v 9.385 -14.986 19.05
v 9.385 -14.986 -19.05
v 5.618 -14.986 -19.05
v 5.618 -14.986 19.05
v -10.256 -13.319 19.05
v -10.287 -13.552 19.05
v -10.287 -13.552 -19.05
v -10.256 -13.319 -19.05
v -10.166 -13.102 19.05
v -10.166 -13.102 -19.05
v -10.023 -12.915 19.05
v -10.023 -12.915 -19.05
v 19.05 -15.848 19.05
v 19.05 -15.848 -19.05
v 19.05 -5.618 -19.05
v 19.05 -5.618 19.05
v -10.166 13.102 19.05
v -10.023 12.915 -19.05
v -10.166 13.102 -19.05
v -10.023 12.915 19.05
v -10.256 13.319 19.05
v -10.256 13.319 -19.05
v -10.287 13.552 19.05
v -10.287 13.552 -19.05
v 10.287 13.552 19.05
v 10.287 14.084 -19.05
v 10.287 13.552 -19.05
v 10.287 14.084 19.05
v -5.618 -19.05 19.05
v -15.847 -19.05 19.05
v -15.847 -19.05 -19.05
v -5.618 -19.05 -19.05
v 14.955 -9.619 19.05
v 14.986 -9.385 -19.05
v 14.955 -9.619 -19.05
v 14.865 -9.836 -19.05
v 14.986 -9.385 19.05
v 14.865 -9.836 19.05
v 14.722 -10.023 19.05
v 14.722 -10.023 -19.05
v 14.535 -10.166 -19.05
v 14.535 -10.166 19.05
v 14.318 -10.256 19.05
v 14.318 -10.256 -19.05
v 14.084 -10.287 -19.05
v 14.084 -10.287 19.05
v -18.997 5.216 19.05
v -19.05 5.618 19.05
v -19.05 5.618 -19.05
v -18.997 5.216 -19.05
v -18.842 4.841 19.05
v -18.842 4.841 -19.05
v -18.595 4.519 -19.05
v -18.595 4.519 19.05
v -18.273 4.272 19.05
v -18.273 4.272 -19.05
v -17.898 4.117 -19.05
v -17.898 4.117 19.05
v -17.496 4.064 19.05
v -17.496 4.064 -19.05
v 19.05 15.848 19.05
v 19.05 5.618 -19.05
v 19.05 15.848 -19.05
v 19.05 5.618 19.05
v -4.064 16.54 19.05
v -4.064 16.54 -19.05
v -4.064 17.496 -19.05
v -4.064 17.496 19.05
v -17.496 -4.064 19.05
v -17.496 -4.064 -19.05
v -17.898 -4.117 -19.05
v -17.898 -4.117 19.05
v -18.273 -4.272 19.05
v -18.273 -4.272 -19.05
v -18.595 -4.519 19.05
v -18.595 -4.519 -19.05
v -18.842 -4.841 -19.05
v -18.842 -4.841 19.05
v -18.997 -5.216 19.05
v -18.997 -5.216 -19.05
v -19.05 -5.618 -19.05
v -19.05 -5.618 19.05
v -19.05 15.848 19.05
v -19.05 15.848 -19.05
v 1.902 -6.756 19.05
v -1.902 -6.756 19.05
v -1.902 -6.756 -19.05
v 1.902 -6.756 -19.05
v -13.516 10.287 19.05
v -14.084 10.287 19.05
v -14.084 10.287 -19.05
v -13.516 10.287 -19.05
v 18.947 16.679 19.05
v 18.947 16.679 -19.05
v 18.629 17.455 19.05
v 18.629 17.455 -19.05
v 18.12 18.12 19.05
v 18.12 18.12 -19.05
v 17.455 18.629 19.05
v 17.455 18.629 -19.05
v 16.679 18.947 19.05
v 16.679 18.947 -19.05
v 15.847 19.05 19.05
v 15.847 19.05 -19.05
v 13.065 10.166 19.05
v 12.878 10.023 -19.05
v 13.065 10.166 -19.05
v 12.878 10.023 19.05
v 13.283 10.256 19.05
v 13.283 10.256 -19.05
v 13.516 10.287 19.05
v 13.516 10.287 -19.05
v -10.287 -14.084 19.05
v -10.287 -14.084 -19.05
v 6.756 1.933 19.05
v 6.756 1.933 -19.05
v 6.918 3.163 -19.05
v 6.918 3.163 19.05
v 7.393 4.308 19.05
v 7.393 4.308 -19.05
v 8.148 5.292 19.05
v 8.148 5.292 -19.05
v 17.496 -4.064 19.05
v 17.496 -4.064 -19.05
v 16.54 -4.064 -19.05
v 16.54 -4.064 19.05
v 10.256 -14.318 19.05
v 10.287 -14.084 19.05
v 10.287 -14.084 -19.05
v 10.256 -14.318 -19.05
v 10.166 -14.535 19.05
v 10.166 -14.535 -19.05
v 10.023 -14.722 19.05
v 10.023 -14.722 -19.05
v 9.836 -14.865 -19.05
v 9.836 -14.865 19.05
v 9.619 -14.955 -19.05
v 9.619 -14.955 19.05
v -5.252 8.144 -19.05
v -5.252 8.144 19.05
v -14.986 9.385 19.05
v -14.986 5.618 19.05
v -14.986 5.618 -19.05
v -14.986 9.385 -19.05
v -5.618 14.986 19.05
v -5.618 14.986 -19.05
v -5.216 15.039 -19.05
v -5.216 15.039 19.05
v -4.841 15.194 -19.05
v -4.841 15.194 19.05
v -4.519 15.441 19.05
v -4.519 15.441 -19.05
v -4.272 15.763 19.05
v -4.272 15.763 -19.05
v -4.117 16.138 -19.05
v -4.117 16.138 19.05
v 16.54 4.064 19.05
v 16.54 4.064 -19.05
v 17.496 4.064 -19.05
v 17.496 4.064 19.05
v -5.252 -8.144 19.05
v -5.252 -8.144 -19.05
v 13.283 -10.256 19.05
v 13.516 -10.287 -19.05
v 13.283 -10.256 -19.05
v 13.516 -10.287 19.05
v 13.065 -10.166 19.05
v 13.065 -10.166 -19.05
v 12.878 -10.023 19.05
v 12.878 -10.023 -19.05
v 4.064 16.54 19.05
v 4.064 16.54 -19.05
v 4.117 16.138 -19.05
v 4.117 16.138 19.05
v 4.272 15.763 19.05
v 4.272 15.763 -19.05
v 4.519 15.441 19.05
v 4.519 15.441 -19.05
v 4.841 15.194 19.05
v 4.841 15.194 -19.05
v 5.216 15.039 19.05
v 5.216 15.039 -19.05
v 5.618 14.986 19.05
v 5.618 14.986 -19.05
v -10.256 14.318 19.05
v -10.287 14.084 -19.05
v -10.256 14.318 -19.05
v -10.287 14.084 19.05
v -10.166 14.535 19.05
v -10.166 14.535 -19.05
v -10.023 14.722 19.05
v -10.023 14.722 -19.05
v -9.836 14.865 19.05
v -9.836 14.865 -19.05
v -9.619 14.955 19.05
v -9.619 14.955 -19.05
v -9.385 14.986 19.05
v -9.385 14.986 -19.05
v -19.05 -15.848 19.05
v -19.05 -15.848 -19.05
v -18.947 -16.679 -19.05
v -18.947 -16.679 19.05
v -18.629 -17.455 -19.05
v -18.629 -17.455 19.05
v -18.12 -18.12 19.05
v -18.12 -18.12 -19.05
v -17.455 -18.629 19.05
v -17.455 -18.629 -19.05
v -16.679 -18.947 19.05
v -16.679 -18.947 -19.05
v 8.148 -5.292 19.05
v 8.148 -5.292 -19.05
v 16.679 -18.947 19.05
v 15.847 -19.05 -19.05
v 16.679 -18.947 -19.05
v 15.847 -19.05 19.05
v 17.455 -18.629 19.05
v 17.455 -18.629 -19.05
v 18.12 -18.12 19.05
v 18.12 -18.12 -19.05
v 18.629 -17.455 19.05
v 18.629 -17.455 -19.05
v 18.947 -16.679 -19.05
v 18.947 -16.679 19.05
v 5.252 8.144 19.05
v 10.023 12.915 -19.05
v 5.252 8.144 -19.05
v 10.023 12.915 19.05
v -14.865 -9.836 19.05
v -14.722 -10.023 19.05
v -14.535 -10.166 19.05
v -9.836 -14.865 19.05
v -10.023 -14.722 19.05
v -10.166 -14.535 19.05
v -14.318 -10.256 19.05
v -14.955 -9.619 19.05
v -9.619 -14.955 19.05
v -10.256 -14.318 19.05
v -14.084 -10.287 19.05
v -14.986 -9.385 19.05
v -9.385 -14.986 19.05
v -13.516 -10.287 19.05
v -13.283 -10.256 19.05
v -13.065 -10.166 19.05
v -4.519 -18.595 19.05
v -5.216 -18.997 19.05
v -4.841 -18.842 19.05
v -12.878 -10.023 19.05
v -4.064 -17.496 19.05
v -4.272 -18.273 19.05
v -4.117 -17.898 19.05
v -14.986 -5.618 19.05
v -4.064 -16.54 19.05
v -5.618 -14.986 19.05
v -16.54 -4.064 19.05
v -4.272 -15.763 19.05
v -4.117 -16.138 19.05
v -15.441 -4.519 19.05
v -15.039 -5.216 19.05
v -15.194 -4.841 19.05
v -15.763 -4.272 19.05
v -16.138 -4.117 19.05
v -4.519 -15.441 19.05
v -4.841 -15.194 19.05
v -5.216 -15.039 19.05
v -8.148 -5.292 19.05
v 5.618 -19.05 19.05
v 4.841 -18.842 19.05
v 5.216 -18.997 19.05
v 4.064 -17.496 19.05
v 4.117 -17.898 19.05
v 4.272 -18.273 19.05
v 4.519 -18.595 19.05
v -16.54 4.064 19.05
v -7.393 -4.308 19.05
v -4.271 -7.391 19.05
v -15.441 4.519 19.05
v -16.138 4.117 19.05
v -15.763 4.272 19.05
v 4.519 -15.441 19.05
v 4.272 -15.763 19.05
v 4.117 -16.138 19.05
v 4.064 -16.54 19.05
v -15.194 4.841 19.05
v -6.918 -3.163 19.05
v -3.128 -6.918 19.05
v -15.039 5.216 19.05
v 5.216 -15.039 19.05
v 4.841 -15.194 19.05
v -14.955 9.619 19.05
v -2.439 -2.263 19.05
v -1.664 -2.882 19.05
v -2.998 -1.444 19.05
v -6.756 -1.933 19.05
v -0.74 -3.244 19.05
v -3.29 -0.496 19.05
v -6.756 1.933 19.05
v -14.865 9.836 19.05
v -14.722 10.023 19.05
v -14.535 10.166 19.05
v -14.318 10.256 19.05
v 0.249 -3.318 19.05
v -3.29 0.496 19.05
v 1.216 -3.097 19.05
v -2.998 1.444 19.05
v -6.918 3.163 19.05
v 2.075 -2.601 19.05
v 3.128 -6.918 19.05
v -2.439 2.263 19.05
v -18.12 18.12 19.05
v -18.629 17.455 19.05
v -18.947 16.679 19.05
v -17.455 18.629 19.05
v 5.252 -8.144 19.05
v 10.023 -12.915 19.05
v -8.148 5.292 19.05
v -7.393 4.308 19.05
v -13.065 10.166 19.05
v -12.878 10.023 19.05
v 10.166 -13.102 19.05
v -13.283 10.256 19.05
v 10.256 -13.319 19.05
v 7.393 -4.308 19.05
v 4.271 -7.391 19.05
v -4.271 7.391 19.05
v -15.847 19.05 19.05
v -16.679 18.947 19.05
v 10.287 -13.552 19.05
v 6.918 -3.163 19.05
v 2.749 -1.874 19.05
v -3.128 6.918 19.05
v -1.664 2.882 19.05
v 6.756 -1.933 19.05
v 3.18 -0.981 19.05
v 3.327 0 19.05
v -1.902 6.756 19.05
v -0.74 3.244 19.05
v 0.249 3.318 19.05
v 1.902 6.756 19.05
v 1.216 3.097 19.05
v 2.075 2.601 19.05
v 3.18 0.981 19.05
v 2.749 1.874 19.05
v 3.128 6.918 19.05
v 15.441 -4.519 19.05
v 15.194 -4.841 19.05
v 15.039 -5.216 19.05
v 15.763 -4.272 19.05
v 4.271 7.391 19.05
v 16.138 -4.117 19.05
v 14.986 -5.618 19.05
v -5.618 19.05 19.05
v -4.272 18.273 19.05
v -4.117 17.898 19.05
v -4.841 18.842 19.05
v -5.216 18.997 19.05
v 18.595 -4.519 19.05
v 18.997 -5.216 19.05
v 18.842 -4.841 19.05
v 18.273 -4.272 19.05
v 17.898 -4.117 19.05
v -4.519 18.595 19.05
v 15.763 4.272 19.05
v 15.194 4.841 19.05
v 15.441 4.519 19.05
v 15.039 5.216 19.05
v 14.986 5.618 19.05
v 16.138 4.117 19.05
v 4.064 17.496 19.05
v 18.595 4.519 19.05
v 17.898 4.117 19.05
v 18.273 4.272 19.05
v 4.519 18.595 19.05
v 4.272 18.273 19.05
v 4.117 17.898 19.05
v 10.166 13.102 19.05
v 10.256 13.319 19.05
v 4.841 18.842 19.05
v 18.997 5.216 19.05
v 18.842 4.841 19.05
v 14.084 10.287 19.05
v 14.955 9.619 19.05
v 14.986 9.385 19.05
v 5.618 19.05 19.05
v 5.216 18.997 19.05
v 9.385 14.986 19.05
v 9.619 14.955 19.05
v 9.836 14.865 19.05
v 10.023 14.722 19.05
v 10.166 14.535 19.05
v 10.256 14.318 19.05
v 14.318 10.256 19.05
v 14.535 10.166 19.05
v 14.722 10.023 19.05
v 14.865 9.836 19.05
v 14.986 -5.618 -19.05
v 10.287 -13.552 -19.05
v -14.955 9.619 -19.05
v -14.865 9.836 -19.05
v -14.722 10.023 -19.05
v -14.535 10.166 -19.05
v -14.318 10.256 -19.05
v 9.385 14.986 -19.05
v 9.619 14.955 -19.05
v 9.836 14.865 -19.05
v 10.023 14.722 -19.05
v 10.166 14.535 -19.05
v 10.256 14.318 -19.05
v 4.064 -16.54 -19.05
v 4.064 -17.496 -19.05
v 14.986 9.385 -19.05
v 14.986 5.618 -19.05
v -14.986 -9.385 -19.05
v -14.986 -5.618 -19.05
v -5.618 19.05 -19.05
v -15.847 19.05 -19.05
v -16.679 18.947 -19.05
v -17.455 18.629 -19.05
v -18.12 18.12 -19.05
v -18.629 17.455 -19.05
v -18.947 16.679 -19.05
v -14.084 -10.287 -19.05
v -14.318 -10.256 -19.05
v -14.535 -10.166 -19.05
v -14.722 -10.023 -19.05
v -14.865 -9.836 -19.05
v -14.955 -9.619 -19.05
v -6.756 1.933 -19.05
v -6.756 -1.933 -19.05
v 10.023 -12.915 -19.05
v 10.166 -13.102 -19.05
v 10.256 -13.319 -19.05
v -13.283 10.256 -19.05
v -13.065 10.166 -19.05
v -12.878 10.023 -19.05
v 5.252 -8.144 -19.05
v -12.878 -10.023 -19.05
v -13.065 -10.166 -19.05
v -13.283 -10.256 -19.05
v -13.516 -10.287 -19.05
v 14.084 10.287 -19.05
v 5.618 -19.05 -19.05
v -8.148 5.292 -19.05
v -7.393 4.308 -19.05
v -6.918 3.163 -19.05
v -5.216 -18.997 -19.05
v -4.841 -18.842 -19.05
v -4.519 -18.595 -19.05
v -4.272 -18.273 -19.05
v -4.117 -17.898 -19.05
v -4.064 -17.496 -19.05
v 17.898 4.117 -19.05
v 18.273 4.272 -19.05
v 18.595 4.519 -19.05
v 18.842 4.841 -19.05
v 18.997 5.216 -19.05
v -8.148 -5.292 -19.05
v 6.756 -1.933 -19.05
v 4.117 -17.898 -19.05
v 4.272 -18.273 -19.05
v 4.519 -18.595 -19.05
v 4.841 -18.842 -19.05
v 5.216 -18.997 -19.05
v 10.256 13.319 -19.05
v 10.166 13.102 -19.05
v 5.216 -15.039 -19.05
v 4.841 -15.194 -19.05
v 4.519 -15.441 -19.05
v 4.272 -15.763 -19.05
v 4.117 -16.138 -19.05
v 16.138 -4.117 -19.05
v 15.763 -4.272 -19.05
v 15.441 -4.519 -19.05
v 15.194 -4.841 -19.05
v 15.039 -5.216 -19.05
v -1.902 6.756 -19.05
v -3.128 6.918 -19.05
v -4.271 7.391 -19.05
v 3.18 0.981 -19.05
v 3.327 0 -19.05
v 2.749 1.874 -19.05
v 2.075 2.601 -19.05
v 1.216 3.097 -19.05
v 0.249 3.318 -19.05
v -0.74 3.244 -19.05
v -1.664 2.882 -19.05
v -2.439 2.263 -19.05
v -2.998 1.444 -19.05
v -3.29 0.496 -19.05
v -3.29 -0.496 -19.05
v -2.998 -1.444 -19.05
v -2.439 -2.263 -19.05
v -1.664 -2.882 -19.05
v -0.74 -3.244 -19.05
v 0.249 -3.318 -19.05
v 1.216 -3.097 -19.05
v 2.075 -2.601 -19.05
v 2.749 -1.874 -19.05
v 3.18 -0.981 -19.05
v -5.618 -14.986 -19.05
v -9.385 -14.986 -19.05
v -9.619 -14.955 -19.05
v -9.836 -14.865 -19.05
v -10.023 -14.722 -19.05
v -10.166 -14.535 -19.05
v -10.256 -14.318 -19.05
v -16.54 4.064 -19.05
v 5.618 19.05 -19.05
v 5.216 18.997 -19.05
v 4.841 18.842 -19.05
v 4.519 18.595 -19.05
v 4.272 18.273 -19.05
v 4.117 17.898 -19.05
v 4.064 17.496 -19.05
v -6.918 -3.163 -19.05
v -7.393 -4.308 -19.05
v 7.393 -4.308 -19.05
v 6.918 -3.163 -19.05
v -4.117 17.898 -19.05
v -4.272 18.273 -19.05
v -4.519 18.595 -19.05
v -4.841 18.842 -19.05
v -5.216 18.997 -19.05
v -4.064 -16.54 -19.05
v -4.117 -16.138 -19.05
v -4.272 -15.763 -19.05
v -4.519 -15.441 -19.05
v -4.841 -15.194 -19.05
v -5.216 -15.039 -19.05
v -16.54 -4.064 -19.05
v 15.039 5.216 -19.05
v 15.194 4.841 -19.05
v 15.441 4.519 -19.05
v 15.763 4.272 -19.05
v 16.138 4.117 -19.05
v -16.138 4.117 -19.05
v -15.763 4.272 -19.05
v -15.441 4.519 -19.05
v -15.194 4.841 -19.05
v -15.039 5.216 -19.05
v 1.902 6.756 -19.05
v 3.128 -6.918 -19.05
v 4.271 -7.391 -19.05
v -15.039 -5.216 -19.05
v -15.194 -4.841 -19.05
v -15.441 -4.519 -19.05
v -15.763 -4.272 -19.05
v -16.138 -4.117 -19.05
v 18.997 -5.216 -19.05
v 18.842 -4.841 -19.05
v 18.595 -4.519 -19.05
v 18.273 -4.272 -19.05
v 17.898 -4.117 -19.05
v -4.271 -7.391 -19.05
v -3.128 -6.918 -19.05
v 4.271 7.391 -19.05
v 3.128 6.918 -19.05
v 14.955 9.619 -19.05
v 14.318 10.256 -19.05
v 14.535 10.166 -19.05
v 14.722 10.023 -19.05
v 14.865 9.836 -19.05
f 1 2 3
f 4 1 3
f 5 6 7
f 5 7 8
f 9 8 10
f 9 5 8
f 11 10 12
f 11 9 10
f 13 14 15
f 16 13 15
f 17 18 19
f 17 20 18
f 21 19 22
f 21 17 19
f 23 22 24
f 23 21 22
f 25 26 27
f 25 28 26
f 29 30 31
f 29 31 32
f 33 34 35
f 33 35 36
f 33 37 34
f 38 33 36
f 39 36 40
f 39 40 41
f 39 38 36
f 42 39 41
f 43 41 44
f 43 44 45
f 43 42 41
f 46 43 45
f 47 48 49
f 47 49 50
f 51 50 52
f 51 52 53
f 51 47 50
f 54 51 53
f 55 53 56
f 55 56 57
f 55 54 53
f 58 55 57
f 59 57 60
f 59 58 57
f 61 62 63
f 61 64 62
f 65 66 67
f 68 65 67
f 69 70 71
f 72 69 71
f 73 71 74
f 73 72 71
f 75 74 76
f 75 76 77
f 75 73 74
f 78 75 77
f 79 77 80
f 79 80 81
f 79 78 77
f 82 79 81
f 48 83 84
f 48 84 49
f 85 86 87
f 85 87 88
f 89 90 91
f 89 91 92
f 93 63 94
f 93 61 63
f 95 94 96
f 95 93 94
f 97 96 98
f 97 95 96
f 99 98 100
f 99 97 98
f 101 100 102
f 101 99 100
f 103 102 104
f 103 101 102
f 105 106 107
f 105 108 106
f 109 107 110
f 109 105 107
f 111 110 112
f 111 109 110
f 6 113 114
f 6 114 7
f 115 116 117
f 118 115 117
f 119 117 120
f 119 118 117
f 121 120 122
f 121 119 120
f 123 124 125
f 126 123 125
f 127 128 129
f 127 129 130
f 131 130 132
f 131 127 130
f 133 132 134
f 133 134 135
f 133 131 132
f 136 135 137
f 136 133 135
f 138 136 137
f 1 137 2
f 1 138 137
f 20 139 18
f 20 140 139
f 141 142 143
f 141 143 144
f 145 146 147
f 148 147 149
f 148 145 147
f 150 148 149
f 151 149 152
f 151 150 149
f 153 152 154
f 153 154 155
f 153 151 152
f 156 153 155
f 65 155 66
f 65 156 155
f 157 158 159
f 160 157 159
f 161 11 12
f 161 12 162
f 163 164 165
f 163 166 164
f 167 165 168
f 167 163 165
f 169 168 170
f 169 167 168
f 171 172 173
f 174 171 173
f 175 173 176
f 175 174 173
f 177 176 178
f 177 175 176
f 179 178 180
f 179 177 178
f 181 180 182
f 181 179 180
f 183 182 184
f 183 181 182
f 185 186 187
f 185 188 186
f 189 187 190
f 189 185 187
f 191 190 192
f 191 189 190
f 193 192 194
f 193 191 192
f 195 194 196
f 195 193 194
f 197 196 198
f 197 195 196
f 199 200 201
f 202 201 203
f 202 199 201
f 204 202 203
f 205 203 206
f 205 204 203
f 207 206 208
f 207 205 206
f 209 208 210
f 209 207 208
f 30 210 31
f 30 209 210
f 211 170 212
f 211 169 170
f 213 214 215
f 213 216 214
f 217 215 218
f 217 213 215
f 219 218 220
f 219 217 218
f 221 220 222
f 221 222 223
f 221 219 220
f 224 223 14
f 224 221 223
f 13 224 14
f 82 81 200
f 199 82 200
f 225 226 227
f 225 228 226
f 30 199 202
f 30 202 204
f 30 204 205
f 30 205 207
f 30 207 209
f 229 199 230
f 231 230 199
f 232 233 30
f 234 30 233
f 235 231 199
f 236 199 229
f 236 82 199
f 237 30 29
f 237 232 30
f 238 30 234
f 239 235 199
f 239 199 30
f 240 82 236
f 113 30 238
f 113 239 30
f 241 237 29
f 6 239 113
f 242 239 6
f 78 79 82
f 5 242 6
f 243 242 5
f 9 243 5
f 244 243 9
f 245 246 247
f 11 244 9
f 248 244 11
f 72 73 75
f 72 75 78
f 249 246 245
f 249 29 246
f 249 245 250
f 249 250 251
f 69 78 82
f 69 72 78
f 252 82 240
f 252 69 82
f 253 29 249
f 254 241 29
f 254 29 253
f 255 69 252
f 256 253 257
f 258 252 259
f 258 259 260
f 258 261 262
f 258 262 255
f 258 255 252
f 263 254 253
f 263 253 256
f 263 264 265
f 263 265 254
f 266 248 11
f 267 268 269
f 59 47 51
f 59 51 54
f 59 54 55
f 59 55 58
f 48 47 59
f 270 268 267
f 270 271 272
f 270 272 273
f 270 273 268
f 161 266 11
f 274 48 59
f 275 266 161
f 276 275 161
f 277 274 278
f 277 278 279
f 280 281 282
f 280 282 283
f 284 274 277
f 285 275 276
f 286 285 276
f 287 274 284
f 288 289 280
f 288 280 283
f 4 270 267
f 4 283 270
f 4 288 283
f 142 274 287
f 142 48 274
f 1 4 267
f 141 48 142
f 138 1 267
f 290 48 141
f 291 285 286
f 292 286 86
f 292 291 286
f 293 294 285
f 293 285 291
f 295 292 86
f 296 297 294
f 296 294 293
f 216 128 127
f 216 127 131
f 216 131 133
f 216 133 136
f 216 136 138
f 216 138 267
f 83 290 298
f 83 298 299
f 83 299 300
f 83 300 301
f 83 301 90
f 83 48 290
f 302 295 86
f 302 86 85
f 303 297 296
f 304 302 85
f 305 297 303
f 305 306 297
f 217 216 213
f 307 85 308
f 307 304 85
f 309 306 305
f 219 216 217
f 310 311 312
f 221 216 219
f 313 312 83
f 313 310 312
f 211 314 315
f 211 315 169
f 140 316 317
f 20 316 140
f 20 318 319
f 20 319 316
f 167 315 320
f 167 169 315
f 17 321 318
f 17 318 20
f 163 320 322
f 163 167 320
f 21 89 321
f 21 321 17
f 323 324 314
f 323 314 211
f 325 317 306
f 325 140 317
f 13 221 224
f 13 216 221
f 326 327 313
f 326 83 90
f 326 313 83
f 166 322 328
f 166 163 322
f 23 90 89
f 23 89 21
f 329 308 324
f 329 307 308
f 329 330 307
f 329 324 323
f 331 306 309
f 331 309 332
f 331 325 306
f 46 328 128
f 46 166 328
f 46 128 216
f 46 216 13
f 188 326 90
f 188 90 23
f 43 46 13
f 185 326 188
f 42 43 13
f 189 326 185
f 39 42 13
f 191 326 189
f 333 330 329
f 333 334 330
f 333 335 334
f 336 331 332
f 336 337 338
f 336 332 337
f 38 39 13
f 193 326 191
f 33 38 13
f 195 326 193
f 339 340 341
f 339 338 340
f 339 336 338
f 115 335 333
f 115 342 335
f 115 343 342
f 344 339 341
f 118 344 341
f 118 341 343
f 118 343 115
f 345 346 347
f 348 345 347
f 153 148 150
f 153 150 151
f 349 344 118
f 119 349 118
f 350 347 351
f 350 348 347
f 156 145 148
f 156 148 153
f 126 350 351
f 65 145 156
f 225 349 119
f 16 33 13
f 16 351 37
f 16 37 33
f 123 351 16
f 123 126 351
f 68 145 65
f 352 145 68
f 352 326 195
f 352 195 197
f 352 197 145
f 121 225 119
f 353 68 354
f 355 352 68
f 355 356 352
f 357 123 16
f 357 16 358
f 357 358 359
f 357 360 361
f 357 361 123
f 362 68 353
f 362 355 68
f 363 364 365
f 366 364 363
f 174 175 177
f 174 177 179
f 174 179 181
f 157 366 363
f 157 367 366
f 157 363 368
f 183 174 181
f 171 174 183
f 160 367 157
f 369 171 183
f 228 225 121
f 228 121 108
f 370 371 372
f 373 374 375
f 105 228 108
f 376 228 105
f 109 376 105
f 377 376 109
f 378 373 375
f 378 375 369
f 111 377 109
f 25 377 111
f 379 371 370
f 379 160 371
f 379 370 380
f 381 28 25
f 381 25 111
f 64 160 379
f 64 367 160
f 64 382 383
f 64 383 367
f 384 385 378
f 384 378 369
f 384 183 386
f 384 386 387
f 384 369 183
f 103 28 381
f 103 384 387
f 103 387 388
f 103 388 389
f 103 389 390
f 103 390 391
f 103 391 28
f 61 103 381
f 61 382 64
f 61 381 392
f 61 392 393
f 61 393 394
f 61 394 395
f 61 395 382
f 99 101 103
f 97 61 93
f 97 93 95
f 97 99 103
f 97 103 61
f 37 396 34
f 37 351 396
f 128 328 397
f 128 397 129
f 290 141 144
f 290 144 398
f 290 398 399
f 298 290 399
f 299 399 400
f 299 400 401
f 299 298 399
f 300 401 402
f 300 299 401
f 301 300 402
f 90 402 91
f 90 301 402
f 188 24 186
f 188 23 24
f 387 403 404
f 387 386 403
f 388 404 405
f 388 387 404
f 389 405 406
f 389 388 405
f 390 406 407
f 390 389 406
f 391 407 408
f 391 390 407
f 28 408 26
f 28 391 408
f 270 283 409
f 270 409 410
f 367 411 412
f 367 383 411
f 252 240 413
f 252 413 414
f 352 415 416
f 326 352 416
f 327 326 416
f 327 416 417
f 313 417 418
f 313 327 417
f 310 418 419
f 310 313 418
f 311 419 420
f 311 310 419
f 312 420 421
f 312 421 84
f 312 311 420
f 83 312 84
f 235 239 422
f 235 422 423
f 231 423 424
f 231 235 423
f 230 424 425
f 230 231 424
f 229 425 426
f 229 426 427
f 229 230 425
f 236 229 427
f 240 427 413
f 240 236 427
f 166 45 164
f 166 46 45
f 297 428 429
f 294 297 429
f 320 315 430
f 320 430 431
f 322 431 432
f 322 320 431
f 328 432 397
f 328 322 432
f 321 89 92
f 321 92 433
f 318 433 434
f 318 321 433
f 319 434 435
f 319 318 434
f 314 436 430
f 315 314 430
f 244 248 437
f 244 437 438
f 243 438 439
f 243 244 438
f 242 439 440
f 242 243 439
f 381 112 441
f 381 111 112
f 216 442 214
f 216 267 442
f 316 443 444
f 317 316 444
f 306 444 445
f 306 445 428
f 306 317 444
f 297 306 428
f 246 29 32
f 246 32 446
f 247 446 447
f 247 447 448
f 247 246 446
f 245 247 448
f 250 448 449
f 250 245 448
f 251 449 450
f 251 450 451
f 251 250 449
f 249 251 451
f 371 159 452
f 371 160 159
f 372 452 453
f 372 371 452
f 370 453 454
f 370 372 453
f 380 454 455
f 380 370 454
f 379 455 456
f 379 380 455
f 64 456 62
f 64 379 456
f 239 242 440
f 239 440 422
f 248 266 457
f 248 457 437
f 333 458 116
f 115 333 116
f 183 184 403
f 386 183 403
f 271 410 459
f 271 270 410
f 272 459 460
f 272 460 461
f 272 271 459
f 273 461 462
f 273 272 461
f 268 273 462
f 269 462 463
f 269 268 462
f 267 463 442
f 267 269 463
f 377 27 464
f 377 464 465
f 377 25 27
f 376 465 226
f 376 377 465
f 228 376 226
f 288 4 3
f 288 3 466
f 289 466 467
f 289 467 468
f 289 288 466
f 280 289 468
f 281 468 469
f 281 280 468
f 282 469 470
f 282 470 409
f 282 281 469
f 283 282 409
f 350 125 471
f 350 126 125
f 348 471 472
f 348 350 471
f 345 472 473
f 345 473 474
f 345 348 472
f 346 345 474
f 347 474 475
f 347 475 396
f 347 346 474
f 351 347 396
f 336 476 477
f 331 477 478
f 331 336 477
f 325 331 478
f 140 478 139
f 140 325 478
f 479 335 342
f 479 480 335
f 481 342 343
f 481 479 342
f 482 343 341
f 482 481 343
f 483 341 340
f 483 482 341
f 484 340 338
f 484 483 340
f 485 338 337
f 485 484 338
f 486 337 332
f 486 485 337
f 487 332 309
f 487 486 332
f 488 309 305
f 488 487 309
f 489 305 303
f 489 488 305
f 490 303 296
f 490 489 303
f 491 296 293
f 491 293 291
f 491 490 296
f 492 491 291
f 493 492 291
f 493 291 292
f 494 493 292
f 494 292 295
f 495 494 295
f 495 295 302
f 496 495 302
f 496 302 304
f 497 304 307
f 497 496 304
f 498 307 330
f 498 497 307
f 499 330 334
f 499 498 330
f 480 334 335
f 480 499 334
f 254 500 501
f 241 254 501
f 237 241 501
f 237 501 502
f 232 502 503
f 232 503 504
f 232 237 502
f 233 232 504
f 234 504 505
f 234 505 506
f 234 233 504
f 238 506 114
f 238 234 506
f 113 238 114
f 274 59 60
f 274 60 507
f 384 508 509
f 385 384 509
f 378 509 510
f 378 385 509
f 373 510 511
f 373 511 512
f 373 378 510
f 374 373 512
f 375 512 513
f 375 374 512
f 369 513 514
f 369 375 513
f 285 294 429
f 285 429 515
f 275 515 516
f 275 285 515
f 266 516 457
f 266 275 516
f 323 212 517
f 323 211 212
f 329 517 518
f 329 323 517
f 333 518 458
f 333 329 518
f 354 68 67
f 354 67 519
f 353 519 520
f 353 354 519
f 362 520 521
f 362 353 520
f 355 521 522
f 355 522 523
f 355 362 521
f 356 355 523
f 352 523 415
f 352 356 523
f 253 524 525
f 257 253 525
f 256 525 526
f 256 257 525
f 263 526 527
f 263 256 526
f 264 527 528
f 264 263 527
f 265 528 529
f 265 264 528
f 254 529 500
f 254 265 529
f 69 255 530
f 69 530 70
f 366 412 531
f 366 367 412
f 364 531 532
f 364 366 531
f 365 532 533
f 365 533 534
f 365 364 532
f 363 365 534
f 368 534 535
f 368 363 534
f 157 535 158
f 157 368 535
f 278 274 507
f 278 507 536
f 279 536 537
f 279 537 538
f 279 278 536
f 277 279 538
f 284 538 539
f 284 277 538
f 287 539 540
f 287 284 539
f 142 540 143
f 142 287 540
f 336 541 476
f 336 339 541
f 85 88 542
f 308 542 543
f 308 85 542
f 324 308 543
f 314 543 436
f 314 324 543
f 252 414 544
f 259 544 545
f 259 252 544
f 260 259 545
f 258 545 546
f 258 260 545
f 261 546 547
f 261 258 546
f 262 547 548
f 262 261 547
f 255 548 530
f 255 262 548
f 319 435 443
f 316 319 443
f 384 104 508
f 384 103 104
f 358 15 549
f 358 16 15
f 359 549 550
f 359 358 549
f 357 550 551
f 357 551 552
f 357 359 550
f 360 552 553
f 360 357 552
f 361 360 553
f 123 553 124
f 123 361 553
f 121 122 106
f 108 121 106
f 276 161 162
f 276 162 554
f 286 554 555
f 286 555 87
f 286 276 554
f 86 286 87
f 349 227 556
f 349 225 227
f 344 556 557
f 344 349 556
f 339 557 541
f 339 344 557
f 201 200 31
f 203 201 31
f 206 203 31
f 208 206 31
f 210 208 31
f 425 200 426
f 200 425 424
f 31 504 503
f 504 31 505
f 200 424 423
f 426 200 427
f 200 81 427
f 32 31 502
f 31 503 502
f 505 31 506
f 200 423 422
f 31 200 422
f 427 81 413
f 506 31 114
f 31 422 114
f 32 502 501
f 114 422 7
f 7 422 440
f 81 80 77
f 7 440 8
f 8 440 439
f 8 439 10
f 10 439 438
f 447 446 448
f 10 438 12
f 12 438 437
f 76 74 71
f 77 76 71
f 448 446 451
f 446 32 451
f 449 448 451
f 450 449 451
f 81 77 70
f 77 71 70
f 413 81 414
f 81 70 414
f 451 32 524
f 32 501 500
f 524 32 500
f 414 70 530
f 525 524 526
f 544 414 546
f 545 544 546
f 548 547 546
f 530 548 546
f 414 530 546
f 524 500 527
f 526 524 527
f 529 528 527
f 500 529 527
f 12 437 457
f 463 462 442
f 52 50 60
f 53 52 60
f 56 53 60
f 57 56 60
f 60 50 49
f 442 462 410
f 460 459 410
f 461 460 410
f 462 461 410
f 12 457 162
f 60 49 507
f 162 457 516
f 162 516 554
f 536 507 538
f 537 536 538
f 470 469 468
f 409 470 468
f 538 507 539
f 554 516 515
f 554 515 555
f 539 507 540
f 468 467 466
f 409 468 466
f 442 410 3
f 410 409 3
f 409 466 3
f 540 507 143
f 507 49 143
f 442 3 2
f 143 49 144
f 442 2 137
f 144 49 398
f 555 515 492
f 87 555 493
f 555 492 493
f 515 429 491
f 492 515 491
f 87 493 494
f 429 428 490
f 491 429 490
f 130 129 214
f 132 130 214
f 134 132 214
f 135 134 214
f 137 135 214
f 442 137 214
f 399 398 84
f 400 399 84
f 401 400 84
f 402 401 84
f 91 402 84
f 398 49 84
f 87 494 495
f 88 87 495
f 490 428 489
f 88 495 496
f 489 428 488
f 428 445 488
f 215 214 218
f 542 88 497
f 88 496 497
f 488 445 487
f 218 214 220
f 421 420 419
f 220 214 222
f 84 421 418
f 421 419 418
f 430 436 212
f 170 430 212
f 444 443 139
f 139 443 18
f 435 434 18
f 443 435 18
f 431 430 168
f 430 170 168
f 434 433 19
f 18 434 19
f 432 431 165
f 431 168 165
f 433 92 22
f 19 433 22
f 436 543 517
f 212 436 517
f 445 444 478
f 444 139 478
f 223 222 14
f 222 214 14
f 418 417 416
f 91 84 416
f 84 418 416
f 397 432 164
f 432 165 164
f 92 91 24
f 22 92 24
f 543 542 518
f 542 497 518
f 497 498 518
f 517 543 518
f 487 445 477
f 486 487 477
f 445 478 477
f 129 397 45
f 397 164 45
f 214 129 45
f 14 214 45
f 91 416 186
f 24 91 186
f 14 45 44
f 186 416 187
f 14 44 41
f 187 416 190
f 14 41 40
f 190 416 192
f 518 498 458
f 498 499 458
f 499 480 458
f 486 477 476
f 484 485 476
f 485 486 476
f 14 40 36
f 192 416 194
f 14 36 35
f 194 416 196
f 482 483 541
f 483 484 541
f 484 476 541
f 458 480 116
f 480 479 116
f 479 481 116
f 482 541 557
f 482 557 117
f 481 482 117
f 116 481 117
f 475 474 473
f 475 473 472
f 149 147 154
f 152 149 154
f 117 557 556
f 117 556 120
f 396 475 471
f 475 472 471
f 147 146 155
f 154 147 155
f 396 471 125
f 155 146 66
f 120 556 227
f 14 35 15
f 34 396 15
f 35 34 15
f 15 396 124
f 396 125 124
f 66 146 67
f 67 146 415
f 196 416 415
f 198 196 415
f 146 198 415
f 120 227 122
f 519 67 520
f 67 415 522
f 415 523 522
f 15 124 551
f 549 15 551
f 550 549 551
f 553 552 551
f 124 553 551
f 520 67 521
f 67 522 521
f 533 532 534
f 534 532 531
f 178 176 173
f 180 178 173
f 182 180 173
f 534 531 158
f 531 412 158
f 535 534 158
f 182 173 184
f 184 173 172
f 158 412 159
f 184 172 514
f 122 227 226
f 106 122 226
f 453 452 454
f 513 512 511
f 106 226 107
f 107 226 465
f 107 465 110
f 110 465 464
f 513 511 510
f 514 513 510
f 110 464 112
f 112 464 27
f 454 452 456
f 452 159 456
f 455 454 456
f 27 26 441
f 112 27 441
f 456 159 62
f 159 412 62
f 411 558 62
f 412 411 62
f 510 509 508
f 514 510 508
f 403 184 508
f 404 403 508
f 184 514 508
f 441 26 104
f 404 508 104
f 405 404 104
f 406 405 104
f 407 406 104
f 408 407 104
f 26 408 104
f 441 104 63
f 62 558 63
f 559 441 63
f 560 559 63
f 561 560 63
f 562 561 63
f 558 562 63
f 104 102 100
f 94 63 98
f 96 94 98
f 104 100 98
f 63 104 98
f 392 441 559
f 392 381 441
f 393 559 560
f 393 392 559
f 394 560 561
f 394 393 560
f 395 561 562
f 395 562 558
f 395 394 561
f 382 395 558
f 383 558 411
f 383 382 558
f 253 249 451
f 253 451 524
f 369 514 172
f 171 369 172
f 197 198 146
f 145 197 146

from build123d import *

# Parameters (mm, degrees)
SKETCH1_R           = 3.3274
BOSS_EXTRUDE1_DEPTH = 19.05


with BuildPart() as part:
    # Sketch1 → Boss-Extrude1 (new body, symmetric)
    with BuildSketch(Plane.XY):
        with BuildLine():
            Line((-4.064, 16.539617552), (-4.064, 17.496382454))
            ThreePointArc((-4.064, 17.496382454), (-4.519044044, 18.594955958), (-5.617617547, 19.050000004))
            Line((-5.617617547, 19.050000004), (-15.84748704, 19.050000004))
            ThreePointArc((-15.84748704, 19.050000004), (-18.12017629, 18.120192086), (-19.050000001, 15.847509297))
            Line((-19.050000001, 15.847509297), (-19.050000001, 5.617617549))
            ThreePointArc((-19.050000001, 5.617617549), (-18.594955957, 4.519044045), (-17.496382454, 4.064))
            Line((-17.496382454, 4.064), (-16.539617549, 4.064))
            ThreePointArc((-16.539617549, 4.064), (-15.441044044, 4.519044045), (-14.986, 5.617617549))
            Line((-14.986, 5.617617549), (-14.986, 9.385342517))
            ThreePointArc((-14.986, 9.385342517), (-14.721898184, 10.022940701), (-14.0843, 10.287042517))
            Line((-14.0843, 10.287042517), (-13.516042086, 10.287042517))
            ThreePointArc((-13.516042086, 10.287042517), (-13.170975923, 10.218404479), (-12.878443117, 10.022939917))
            Line((-12.878443117, 10.022939917), (-8.14758008, 5.292065242))
            ThreePointArc((-8.14758008, 5.292065242), (-7.117955877, 3.751120652), (-6.756399998, 1.933453582))
            Line((-6.756399998, 1.933453582), (-6.756399998, -1.933453584))
            ThreePointArc((-6.756399998, -1.933453584), (-7.117955877, -3.751120652), (-8.147580078, -5.292065242))
            Line((-8.147580078, -5.292065242), (-12.878443116, -10.022939917))
            ThreePointArc((-12.878443116, -10.022939917), (-13.170975922, -10.21840448), (-13.516042086, -10.287042518))
            Line((-13.516042086, -10.287042518), (-14.0843, -10.287042518))
            ThreePointArc((-14.0843, -10.287042518), (-14.721898185, -10.022940703), (-14.986, -9.385342518))
            Line((-14.986, -9.385342518), (-14.986, -5.617617549))
            ThreePointArc((-14.986, -5.617617549), (-15.441044044, -4.519044046), (-16.539617547, -4.064))
            Line((-16.539617547, -4.064), (-17.496382452, -4.064))
            ThreePointArc((-17.496382452, -4.064), (-18.594955956, -4.519044044), (-19.050000001, -5.617617547))
            Line((-19.050000001, -5.617617547), (-19.050000001, -15.84751072))
            ThreePointArc((-19.050000001, -15.84751072), (-18.120175718, -18.120192644), (-15.84748687, -19.050000001))
            Line((-15.84748687, -19.050000001), (-5.617617549, -19.050000001))
            ThreePointArc((-5.617617549, -19.050000001), (-4.519044046, -18.594955957), (-4.064, -17.496382454))
            Line((-4.064, -17.496382454), (-4.064, -16.539617549))
            ThreePointArc((-4.064, -16.539617549), (-4.519044045, -15.441044044), (-5.617617549, -14.985999999))
            Line((-5.617617549, -14.985999999), (-9.3853, -14.985999999))
            ThreePointArc((-9.3853, -14.985999999), (-10.022898185, -14.721898184), (-10.287, -14.084299999))
            Line((-10.287, -14.084299999), (-10.287, -13.552357131))
            ThreePointArc((-10.287, -13.552357131), (-10.218362387, -13.207291993), (-10.022898969, -12.914759731))
            Line((-10.022898969, -12.914759731), (-5.252158104, -8.14400713))
            ThreePointArc((-5.252158104, -8.14400713), (-3.715177371, -7.117027388), (-1.902183976, -6.7564))
            Line((-1.902183976, -6.7564), (1.902183976, -6.7564))
            ThreePointArc((1.902183976, -6.7564), (3.715177372, -7.117027388), (5.252158106, -8.144007132))
            Line((5.252158106, -8.144007132), (10.022898969, -12.91475973))
            ThreePointArc((10.022898969, -12.91475973), (10.218362387, -13.207291993), (10.287000001, -13.552357132))
            Line((10.287000001, -13.552357132), (10.287000001, -14.0843))
            ThreePointArc((10.287000001, -14.0843), (10.022898185, -14.721898184), (9.385300001, -14.986))
            Line((9.385300001, -14.986), (5.617617549, -14.986))
            ThreePointArc((5.617617549, -14.986), (4.519044045, -15.441044044), (4.064, -16.539617547))
            Line((4.064, -16.539617547), (4.064, -17.496382452))
            ThreePointArc((4.064, -17.496382452), (4.519044043, -18.594955955), (5.617617546, -19.050000001))
            Line((5.617617546, -19.050000001), (15.847486867, -19.050000001))
            ThreePointArc((15.847486867, -19.050000001), (18.120175716, -18.120192646), (19.05, -15.847510723))
            Line((19.05, -15.847510723), (19.05, -5.617617549))
            ThreePointArc((19.05, -5.617617549), (18.594955955, -4.519044045), (17.496382451, -4.064))
            Line((17.496382451, -4.064), (16.539617548, -4.064))
            ThreePointArc((16.539617548, -4.064), (15.441044044, -4.519044045), (14.985999999, -5.617617549))
            Line((14.985999999, -5.617617549), (14.985999999, -9.385342517))
            ThreePointArc((14.985999999, -9.385342517), (14.721898184, -10.022940701), (14.084299999, -10.287042517))
            Line((14.084299999, -10.287042517), (13.516042085, -10.287042517))
            ThreePointArc((13.516042085, -10.287042517), (13.170975922, -10.218404479), (12.878443117, -10.022939917))
            Line((12.878443117, -10.022939917), (8.147580079, -5.292065242))
            ThreePointArc((8.147580079, -5.292065242), (7.117955877, -3.751120652), (6.756399998, -1.933453583))
            Line((6.756399998, -1.933453583), (6.756399998, 1.933453583))
            ThreePointArc((6.756399998, 1.933453583), (7.117955877, 3.751120652), (8.147580078, 5.292065242))
            Line((8.147580078, 5.292065242), (12.878443116, 10.022939916))
            ThreePointArc((12.878443116, 10.022939916), (13.170975922, 10.218404477), (13.516042084, 10.287042515))
            Line((13.516042084, 10.287042515), (14.084299998, 10.287042515))
            ThreePointArc((14.084299998, 10.287042515), (14.721898183, 10.0229407), (14.985999998, 9.385342515))
            Line((14.985999998, 9.385342515), (14.985999998, 5.617617546))
            ThreePointArc((14.985999998, 5.617617546), (15.441044043, 4.519044042), (16.539617547, 4.063999997))
            Line((16.539617547, 4.063999997), (17.49638245, 4.063999997))
            ThreePointArc((17.49638245, 4.063999997), (18.594955956, 4.519044042), (19.05, 5.617617548))
            Line((19.05, 5.617617548), (19.05, 15.8475093))
            ThreePointArc((19.05, 15.8475093), (18.120176289, 18.120192086), (15.847487041, 19.050000004))
            Line((15.847487041, 19.050000004), (5.617617548, 19.050000004))
            ThreePointArc((5.617617548, 19.050000004), (4.519044044, 18.594955959), (4.063999999, 17.496382454))
            Line((4.063999999, 17.496382454), (4.063999999, 16.539617552))
            ThreePointArc((4.063999999, 16.539617552), (4.519044044, 15.441044047), (5.617617548, 14.986000002))
            Line((5.617617548, 14.986000002), (9.385299999, 14.986000002))
            ThreePointArc((9.385299999, 14.986000002), (10.022898183, 14.721898187), (10.286999999, 14.084300002))
            Line((10.286999999, 14.084300002), (10.286999999, 13.552357134))
            ThreePointArc((10.286999999, 13.552357134), (10.218362386, 13.207291996), (10.022898968, 12.914759734))
            Line((10.022898968, 12.914759734), (5.252158103, 8.144007133))
            ThreePointArc((5.252158103, 8.144007133), (3.71517737, 7.117027391), (1.902183975, 6.756400003))
            Line((1.902183975, 6.756400003), (-1.902183977, 6.756400003))
            ThreePointArc((-1.902183977, 6.756400003), (-3.715177373, 7.117027391), (-5.252158106, 8.144007134))
            Line((-5.252158106, 8.144007134), (-10.022898969, 12.914759733))
            ThreePointArc((-10.022898969, 12.914759733), (-10.218362387, 13.207291995), (-10.287000001, 13.552357134))
            Line((-10.287000001, 13.552357134), (-10.287000001, 14.084300002))
            ThreePointArc((-10.287000001, 14.084300002), (-10.022898186, 14.721898187), (-9.385300001, 14.986000002))
            Line((-9.385300001, 14.986000002), (-5.617617549, 14.986000002))
            ThreePointArc((-5.617617549, 14.986000002), (-4.519044044, 15.441044047), (-4.064, 16.539617552))
        make_face()
        Circle(SKETCH1_R, mode=Mode.SUBTRACT)
    extrude(amount=BOSS_EXTRUDE1_DEPTH, both=True)


solid = part.part
